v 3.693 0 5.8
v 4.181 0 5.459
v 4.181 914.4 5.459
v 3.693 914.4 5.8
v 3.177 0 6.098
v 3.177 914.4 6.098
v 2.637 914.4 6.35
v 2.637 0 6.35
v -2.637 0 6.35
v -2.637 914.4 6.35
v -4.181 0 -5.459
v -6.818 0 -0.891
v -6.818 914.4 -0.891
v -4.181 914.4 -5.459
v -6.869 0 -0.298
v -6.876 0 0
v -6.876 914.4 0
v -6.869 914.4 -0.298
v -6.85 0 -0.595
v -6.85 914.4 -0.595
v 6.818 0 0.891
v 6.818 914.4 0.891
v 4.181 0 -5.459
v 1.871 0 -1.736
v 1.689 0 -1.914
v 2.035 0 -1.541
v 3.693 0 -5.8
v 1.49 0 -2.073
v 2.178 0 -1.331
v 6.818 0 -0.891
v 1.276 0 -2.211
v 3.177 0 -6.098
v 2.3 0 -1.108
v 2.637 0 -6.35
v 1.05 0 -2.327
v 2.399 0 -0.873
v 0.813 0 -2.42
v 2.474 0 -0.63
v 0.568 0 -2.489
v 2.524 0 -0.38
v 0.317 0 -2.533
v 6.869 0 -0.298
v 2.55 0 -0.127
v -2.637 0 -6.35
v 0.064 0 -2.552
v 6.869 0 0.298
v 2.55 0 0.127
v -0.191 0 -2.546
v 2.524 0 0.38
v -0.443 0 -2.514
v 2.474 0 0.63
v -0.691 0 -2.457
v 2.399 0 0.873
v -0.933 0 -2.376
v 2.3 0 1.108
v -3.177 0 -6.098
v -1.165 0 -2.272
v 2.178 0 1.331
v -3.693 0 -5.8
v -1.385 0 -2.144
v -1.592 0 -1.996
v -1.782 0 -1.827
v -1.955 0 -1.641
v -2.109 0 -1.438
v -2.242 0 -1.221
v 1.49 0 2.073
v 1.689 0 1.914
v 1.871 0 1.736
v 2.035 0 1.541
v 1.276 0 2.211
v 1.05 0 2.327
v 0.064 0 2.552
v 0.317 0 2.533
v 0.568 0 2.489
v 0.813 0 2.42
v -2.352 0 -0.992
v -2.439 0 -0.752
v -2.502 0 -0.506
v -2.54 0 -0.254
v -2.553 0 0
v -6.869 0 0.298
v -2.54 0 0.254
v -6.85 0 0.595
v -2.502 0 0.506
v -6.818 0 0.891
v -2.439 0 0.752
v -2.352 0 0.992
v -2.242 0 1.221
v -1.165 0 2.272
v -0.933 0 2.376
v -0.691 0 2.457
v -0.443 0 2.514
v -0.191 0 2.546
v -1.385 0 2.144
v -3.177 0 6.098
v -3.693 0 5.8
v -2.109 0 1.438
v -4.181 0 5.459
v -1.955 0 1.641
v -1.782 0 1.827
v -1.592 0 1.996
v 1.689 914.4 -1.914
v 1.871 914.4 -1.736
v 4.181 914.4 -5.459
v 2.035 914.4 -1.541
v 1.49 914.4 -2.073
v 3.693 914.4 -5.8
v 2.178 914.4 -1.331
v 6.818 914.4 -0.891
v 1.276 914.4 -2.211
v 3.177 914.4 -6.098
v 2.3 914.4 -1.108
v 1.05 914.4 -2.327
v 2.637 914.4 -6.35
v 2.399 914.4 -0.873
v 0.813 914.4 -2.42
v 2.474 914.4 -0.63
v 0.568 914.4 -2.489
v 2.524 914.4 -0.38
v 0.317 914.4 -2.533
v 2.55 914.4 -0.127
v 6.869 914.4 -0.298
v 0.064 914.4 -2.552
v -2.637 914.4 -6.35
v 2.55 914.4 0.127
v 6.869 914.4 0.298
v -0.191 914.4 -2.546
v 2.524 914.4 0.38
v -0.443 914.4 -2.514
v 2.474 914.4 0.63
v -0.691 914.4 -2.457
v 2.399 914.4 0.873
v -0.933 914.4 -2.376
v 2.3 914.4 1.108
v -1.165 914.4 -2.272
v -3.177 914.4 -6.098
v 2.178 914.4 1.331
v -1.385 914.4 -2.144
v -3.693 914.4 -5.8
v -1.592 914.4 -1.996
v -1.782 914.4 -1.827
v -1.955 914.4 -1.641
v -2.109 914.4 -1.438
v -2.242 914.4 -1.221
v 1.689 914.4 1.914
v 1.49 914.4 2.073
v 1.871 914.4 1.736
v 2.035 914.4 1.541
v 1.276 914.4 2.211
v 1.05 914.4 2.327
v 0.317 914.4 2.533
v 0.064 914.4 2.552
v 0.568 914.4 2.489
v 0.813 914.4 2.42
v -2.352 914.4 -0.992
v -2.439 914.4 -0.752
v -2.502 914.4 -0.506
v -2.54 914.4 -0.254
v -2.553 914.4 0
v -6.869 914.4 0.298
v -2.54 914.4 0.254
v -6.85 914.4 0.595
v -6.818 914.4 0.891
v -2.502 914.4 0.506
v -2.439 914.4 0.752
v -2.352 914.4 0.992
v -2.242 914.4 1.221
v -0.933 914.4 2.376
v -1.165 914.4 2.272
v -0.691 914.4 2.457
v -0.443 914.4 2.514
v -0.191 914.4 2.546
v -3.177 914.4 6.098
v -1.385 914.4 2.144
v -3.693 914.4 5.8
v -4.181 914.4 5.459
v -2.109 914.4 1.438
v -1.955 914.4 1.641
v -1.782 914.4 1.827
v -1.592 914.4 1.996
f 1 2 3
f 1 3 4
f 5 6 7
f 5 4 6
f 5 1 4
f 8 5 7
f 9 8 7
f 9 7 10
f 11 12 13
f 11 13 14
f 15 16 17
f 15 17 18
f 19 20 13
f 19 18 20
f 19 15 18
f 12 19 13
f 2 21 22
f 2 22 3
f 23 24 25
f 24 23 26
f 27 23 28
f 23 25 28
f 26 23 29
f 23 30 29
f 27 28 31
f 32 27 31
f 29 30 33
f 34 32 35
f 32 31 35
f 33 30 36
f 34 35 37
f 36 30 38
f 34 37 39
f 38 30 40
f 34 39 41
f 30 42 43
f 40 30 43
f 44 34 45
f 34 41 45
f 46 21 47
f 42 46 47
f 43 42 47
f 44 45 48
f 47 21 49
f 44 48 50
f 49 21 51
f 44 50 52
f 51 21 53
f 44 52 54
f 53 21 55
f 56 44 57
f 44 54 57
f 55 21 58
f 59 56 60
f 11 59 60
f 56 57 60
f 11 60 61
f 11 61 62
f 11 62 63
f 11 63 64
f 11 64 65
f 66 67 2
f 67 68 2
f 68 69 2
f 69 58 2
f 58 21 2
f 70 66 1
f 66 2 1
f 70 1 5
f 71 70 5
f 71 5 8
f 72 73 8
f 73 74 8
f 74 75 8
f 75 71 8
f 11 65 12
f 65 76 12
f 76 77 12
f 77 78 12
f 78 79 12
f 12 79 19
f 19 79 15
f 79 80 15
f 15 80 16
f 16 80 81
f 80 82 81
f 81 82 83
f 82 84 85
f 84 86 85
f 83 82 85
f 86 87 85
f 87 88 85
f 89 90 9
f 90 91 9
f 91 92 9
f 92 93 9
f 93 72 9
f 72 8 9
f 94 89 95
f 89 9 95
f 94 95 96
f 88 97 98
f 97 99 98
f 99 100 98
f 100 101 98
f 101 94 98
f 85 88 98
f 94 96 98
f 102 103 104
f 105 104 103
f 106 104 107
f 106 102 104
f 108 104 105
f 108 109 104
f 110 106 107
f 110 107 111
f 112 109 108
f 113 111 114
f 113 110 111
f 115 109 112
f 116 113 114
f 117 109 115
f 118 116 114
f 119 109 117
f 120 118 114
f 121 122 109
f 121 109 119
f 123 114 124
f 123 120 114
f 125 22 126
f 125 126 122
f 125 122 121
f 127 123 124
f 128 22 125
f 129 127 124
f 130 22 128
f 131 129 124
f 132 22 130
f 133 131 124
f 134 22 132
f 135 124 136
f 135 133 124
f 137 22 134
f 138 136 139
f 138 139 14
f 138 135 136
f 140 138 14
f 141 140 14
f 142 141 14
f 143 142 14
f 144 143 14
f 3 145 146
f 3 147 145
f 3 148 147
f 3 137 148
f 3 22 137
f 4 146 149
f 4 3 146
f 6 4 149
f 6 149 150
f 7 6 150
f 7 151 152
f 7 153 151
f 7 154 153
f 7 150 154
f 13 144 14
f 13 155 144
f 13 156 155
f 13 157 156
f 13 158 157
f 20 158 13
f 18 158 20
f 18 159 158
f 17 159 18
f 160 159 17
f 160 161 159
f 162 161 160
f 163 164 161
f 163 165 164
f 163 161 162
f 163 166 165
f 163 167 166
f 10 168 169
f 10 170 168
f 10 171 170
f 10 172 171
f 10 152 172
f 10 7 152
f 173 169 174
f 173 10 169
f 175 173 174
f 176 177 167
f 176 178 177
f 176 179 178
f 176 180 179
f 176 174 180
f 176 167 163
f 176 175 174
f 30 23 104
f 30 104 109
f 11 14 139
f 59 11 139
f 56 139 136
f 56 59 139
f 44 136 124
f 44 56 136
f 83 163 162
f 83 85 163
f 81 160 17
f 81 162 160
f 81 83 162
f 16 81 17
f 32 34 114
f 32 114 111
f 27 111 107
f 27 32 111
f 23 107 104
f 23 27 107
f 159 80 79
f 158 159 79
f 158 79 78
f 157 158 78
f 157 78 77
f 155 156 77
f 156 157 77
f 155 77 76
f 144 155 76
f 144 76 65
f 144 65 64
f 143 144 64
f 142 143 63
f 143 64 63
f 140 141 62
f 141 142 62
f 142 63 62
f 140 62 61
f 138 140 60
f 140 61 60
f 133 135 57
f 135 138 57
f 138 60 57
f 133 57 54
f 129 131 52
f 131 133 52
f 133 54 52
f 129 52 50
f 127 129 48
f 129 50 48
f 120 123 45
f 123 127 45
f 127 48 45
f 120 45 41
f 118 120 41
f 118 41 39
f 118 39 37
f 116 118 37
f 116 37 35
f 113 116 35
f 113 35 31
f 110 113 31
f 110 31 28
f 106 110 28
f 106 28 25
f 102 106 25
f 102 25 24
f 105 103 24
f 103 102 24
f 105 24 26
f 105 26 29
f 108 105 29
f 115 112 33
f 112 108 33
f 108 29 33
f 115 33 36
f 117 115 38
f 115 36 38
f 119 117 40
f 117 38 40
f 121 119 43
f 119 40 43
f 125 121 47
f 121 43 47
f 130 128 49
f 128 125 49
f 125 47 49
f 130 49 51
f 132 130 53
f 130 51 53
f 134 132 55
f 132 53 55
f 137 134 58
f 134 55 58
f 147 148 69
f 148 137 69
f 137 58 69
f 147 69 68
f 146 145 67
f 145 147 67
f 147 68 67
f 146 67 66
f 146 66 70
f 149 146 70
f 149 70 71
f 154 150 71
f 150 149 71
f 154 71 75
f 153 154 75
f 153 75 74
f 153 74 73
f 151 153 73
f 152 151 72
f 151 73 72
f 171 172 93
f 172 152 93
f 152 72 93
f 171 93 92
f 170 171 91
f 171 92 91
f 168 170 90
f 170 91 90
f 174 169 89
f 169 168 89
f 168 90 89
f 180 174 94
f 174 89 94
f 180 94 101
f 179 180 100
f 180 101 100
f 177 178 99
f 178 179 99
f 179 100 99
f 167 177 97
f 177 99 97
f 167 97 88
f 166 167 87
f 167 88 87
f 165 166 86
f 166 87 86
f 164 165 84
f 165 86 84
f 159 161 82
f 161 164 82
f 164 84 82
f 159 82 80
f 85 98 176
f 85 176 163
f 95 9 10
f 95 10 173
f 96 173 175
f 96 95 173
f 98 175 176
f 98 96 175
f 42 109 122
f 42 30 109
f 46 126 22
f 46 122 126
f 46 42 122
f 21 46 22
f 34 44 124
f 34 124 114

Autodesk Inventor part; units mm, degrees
ref_plane "YZ Plane" through (0, 0, 0) normal (1, 0, 0) x (0, 1, 0)
ref_plane "XZ Plane" through (0, 0, 0) normal (0, 1, 0) x (-1, 0, 0)
ref_plane "XY Plane" through (0, 0, 0) normal (0, 0, 1) x (1, 0, 0)
sketch "Sketch1" plane through (0, 0, 0) normal (0, 1, 0) x (-1, 0, 0)
  line L0 (7.3323, 0) -> (3.6662, -6.35)
  line L1 (3.6662, -6.35) -> (-3.6662, -6.35)
  line L2 (-3.6662, -6.35) -> (-7.3323, 0)
  line L3 (-7.3323, 0) -> (-3.6662, 6.35)
  line L4 (-3.6662, 6.35) -> (3.6662, 6.35)
  line L5 (3.6662, 6.35) -> (7.3323, 0)
  circle A0 centre (0, 0) radius 2.5527
  circle A1 centre (0, 0) radius 6.8758
  point P0 (2.637, -6.35)
  point P1 (4.1808, -5.4587)
  point P2 (6.8178, -0.8913)
  point P3 (6.8178, 0.8913)
  point P4 (4.1808, 5.4587)
  point P5 (2.637, 6.35)
  point P6 (-2.637, 6.35)
  point P7 (-4.1808, 5.4587)
  point P8 (-6.8178, 0.8913)
  point P9 (-6.8178, -0.8913)
  point P10 (-4.1808, -5.4587)
  point P11 (-2.637, -6.35)
  dimension "d0" = 6.35
  dimension "d1" = 5.1054
  dimension "d2" = 13.7516
extrude "Extrusion1" add sketch "Sketch1" along normal blind 914.4 contours L0 A1 L1 L2 L3 L4 L5
properties part number "thunder hex 36in"
